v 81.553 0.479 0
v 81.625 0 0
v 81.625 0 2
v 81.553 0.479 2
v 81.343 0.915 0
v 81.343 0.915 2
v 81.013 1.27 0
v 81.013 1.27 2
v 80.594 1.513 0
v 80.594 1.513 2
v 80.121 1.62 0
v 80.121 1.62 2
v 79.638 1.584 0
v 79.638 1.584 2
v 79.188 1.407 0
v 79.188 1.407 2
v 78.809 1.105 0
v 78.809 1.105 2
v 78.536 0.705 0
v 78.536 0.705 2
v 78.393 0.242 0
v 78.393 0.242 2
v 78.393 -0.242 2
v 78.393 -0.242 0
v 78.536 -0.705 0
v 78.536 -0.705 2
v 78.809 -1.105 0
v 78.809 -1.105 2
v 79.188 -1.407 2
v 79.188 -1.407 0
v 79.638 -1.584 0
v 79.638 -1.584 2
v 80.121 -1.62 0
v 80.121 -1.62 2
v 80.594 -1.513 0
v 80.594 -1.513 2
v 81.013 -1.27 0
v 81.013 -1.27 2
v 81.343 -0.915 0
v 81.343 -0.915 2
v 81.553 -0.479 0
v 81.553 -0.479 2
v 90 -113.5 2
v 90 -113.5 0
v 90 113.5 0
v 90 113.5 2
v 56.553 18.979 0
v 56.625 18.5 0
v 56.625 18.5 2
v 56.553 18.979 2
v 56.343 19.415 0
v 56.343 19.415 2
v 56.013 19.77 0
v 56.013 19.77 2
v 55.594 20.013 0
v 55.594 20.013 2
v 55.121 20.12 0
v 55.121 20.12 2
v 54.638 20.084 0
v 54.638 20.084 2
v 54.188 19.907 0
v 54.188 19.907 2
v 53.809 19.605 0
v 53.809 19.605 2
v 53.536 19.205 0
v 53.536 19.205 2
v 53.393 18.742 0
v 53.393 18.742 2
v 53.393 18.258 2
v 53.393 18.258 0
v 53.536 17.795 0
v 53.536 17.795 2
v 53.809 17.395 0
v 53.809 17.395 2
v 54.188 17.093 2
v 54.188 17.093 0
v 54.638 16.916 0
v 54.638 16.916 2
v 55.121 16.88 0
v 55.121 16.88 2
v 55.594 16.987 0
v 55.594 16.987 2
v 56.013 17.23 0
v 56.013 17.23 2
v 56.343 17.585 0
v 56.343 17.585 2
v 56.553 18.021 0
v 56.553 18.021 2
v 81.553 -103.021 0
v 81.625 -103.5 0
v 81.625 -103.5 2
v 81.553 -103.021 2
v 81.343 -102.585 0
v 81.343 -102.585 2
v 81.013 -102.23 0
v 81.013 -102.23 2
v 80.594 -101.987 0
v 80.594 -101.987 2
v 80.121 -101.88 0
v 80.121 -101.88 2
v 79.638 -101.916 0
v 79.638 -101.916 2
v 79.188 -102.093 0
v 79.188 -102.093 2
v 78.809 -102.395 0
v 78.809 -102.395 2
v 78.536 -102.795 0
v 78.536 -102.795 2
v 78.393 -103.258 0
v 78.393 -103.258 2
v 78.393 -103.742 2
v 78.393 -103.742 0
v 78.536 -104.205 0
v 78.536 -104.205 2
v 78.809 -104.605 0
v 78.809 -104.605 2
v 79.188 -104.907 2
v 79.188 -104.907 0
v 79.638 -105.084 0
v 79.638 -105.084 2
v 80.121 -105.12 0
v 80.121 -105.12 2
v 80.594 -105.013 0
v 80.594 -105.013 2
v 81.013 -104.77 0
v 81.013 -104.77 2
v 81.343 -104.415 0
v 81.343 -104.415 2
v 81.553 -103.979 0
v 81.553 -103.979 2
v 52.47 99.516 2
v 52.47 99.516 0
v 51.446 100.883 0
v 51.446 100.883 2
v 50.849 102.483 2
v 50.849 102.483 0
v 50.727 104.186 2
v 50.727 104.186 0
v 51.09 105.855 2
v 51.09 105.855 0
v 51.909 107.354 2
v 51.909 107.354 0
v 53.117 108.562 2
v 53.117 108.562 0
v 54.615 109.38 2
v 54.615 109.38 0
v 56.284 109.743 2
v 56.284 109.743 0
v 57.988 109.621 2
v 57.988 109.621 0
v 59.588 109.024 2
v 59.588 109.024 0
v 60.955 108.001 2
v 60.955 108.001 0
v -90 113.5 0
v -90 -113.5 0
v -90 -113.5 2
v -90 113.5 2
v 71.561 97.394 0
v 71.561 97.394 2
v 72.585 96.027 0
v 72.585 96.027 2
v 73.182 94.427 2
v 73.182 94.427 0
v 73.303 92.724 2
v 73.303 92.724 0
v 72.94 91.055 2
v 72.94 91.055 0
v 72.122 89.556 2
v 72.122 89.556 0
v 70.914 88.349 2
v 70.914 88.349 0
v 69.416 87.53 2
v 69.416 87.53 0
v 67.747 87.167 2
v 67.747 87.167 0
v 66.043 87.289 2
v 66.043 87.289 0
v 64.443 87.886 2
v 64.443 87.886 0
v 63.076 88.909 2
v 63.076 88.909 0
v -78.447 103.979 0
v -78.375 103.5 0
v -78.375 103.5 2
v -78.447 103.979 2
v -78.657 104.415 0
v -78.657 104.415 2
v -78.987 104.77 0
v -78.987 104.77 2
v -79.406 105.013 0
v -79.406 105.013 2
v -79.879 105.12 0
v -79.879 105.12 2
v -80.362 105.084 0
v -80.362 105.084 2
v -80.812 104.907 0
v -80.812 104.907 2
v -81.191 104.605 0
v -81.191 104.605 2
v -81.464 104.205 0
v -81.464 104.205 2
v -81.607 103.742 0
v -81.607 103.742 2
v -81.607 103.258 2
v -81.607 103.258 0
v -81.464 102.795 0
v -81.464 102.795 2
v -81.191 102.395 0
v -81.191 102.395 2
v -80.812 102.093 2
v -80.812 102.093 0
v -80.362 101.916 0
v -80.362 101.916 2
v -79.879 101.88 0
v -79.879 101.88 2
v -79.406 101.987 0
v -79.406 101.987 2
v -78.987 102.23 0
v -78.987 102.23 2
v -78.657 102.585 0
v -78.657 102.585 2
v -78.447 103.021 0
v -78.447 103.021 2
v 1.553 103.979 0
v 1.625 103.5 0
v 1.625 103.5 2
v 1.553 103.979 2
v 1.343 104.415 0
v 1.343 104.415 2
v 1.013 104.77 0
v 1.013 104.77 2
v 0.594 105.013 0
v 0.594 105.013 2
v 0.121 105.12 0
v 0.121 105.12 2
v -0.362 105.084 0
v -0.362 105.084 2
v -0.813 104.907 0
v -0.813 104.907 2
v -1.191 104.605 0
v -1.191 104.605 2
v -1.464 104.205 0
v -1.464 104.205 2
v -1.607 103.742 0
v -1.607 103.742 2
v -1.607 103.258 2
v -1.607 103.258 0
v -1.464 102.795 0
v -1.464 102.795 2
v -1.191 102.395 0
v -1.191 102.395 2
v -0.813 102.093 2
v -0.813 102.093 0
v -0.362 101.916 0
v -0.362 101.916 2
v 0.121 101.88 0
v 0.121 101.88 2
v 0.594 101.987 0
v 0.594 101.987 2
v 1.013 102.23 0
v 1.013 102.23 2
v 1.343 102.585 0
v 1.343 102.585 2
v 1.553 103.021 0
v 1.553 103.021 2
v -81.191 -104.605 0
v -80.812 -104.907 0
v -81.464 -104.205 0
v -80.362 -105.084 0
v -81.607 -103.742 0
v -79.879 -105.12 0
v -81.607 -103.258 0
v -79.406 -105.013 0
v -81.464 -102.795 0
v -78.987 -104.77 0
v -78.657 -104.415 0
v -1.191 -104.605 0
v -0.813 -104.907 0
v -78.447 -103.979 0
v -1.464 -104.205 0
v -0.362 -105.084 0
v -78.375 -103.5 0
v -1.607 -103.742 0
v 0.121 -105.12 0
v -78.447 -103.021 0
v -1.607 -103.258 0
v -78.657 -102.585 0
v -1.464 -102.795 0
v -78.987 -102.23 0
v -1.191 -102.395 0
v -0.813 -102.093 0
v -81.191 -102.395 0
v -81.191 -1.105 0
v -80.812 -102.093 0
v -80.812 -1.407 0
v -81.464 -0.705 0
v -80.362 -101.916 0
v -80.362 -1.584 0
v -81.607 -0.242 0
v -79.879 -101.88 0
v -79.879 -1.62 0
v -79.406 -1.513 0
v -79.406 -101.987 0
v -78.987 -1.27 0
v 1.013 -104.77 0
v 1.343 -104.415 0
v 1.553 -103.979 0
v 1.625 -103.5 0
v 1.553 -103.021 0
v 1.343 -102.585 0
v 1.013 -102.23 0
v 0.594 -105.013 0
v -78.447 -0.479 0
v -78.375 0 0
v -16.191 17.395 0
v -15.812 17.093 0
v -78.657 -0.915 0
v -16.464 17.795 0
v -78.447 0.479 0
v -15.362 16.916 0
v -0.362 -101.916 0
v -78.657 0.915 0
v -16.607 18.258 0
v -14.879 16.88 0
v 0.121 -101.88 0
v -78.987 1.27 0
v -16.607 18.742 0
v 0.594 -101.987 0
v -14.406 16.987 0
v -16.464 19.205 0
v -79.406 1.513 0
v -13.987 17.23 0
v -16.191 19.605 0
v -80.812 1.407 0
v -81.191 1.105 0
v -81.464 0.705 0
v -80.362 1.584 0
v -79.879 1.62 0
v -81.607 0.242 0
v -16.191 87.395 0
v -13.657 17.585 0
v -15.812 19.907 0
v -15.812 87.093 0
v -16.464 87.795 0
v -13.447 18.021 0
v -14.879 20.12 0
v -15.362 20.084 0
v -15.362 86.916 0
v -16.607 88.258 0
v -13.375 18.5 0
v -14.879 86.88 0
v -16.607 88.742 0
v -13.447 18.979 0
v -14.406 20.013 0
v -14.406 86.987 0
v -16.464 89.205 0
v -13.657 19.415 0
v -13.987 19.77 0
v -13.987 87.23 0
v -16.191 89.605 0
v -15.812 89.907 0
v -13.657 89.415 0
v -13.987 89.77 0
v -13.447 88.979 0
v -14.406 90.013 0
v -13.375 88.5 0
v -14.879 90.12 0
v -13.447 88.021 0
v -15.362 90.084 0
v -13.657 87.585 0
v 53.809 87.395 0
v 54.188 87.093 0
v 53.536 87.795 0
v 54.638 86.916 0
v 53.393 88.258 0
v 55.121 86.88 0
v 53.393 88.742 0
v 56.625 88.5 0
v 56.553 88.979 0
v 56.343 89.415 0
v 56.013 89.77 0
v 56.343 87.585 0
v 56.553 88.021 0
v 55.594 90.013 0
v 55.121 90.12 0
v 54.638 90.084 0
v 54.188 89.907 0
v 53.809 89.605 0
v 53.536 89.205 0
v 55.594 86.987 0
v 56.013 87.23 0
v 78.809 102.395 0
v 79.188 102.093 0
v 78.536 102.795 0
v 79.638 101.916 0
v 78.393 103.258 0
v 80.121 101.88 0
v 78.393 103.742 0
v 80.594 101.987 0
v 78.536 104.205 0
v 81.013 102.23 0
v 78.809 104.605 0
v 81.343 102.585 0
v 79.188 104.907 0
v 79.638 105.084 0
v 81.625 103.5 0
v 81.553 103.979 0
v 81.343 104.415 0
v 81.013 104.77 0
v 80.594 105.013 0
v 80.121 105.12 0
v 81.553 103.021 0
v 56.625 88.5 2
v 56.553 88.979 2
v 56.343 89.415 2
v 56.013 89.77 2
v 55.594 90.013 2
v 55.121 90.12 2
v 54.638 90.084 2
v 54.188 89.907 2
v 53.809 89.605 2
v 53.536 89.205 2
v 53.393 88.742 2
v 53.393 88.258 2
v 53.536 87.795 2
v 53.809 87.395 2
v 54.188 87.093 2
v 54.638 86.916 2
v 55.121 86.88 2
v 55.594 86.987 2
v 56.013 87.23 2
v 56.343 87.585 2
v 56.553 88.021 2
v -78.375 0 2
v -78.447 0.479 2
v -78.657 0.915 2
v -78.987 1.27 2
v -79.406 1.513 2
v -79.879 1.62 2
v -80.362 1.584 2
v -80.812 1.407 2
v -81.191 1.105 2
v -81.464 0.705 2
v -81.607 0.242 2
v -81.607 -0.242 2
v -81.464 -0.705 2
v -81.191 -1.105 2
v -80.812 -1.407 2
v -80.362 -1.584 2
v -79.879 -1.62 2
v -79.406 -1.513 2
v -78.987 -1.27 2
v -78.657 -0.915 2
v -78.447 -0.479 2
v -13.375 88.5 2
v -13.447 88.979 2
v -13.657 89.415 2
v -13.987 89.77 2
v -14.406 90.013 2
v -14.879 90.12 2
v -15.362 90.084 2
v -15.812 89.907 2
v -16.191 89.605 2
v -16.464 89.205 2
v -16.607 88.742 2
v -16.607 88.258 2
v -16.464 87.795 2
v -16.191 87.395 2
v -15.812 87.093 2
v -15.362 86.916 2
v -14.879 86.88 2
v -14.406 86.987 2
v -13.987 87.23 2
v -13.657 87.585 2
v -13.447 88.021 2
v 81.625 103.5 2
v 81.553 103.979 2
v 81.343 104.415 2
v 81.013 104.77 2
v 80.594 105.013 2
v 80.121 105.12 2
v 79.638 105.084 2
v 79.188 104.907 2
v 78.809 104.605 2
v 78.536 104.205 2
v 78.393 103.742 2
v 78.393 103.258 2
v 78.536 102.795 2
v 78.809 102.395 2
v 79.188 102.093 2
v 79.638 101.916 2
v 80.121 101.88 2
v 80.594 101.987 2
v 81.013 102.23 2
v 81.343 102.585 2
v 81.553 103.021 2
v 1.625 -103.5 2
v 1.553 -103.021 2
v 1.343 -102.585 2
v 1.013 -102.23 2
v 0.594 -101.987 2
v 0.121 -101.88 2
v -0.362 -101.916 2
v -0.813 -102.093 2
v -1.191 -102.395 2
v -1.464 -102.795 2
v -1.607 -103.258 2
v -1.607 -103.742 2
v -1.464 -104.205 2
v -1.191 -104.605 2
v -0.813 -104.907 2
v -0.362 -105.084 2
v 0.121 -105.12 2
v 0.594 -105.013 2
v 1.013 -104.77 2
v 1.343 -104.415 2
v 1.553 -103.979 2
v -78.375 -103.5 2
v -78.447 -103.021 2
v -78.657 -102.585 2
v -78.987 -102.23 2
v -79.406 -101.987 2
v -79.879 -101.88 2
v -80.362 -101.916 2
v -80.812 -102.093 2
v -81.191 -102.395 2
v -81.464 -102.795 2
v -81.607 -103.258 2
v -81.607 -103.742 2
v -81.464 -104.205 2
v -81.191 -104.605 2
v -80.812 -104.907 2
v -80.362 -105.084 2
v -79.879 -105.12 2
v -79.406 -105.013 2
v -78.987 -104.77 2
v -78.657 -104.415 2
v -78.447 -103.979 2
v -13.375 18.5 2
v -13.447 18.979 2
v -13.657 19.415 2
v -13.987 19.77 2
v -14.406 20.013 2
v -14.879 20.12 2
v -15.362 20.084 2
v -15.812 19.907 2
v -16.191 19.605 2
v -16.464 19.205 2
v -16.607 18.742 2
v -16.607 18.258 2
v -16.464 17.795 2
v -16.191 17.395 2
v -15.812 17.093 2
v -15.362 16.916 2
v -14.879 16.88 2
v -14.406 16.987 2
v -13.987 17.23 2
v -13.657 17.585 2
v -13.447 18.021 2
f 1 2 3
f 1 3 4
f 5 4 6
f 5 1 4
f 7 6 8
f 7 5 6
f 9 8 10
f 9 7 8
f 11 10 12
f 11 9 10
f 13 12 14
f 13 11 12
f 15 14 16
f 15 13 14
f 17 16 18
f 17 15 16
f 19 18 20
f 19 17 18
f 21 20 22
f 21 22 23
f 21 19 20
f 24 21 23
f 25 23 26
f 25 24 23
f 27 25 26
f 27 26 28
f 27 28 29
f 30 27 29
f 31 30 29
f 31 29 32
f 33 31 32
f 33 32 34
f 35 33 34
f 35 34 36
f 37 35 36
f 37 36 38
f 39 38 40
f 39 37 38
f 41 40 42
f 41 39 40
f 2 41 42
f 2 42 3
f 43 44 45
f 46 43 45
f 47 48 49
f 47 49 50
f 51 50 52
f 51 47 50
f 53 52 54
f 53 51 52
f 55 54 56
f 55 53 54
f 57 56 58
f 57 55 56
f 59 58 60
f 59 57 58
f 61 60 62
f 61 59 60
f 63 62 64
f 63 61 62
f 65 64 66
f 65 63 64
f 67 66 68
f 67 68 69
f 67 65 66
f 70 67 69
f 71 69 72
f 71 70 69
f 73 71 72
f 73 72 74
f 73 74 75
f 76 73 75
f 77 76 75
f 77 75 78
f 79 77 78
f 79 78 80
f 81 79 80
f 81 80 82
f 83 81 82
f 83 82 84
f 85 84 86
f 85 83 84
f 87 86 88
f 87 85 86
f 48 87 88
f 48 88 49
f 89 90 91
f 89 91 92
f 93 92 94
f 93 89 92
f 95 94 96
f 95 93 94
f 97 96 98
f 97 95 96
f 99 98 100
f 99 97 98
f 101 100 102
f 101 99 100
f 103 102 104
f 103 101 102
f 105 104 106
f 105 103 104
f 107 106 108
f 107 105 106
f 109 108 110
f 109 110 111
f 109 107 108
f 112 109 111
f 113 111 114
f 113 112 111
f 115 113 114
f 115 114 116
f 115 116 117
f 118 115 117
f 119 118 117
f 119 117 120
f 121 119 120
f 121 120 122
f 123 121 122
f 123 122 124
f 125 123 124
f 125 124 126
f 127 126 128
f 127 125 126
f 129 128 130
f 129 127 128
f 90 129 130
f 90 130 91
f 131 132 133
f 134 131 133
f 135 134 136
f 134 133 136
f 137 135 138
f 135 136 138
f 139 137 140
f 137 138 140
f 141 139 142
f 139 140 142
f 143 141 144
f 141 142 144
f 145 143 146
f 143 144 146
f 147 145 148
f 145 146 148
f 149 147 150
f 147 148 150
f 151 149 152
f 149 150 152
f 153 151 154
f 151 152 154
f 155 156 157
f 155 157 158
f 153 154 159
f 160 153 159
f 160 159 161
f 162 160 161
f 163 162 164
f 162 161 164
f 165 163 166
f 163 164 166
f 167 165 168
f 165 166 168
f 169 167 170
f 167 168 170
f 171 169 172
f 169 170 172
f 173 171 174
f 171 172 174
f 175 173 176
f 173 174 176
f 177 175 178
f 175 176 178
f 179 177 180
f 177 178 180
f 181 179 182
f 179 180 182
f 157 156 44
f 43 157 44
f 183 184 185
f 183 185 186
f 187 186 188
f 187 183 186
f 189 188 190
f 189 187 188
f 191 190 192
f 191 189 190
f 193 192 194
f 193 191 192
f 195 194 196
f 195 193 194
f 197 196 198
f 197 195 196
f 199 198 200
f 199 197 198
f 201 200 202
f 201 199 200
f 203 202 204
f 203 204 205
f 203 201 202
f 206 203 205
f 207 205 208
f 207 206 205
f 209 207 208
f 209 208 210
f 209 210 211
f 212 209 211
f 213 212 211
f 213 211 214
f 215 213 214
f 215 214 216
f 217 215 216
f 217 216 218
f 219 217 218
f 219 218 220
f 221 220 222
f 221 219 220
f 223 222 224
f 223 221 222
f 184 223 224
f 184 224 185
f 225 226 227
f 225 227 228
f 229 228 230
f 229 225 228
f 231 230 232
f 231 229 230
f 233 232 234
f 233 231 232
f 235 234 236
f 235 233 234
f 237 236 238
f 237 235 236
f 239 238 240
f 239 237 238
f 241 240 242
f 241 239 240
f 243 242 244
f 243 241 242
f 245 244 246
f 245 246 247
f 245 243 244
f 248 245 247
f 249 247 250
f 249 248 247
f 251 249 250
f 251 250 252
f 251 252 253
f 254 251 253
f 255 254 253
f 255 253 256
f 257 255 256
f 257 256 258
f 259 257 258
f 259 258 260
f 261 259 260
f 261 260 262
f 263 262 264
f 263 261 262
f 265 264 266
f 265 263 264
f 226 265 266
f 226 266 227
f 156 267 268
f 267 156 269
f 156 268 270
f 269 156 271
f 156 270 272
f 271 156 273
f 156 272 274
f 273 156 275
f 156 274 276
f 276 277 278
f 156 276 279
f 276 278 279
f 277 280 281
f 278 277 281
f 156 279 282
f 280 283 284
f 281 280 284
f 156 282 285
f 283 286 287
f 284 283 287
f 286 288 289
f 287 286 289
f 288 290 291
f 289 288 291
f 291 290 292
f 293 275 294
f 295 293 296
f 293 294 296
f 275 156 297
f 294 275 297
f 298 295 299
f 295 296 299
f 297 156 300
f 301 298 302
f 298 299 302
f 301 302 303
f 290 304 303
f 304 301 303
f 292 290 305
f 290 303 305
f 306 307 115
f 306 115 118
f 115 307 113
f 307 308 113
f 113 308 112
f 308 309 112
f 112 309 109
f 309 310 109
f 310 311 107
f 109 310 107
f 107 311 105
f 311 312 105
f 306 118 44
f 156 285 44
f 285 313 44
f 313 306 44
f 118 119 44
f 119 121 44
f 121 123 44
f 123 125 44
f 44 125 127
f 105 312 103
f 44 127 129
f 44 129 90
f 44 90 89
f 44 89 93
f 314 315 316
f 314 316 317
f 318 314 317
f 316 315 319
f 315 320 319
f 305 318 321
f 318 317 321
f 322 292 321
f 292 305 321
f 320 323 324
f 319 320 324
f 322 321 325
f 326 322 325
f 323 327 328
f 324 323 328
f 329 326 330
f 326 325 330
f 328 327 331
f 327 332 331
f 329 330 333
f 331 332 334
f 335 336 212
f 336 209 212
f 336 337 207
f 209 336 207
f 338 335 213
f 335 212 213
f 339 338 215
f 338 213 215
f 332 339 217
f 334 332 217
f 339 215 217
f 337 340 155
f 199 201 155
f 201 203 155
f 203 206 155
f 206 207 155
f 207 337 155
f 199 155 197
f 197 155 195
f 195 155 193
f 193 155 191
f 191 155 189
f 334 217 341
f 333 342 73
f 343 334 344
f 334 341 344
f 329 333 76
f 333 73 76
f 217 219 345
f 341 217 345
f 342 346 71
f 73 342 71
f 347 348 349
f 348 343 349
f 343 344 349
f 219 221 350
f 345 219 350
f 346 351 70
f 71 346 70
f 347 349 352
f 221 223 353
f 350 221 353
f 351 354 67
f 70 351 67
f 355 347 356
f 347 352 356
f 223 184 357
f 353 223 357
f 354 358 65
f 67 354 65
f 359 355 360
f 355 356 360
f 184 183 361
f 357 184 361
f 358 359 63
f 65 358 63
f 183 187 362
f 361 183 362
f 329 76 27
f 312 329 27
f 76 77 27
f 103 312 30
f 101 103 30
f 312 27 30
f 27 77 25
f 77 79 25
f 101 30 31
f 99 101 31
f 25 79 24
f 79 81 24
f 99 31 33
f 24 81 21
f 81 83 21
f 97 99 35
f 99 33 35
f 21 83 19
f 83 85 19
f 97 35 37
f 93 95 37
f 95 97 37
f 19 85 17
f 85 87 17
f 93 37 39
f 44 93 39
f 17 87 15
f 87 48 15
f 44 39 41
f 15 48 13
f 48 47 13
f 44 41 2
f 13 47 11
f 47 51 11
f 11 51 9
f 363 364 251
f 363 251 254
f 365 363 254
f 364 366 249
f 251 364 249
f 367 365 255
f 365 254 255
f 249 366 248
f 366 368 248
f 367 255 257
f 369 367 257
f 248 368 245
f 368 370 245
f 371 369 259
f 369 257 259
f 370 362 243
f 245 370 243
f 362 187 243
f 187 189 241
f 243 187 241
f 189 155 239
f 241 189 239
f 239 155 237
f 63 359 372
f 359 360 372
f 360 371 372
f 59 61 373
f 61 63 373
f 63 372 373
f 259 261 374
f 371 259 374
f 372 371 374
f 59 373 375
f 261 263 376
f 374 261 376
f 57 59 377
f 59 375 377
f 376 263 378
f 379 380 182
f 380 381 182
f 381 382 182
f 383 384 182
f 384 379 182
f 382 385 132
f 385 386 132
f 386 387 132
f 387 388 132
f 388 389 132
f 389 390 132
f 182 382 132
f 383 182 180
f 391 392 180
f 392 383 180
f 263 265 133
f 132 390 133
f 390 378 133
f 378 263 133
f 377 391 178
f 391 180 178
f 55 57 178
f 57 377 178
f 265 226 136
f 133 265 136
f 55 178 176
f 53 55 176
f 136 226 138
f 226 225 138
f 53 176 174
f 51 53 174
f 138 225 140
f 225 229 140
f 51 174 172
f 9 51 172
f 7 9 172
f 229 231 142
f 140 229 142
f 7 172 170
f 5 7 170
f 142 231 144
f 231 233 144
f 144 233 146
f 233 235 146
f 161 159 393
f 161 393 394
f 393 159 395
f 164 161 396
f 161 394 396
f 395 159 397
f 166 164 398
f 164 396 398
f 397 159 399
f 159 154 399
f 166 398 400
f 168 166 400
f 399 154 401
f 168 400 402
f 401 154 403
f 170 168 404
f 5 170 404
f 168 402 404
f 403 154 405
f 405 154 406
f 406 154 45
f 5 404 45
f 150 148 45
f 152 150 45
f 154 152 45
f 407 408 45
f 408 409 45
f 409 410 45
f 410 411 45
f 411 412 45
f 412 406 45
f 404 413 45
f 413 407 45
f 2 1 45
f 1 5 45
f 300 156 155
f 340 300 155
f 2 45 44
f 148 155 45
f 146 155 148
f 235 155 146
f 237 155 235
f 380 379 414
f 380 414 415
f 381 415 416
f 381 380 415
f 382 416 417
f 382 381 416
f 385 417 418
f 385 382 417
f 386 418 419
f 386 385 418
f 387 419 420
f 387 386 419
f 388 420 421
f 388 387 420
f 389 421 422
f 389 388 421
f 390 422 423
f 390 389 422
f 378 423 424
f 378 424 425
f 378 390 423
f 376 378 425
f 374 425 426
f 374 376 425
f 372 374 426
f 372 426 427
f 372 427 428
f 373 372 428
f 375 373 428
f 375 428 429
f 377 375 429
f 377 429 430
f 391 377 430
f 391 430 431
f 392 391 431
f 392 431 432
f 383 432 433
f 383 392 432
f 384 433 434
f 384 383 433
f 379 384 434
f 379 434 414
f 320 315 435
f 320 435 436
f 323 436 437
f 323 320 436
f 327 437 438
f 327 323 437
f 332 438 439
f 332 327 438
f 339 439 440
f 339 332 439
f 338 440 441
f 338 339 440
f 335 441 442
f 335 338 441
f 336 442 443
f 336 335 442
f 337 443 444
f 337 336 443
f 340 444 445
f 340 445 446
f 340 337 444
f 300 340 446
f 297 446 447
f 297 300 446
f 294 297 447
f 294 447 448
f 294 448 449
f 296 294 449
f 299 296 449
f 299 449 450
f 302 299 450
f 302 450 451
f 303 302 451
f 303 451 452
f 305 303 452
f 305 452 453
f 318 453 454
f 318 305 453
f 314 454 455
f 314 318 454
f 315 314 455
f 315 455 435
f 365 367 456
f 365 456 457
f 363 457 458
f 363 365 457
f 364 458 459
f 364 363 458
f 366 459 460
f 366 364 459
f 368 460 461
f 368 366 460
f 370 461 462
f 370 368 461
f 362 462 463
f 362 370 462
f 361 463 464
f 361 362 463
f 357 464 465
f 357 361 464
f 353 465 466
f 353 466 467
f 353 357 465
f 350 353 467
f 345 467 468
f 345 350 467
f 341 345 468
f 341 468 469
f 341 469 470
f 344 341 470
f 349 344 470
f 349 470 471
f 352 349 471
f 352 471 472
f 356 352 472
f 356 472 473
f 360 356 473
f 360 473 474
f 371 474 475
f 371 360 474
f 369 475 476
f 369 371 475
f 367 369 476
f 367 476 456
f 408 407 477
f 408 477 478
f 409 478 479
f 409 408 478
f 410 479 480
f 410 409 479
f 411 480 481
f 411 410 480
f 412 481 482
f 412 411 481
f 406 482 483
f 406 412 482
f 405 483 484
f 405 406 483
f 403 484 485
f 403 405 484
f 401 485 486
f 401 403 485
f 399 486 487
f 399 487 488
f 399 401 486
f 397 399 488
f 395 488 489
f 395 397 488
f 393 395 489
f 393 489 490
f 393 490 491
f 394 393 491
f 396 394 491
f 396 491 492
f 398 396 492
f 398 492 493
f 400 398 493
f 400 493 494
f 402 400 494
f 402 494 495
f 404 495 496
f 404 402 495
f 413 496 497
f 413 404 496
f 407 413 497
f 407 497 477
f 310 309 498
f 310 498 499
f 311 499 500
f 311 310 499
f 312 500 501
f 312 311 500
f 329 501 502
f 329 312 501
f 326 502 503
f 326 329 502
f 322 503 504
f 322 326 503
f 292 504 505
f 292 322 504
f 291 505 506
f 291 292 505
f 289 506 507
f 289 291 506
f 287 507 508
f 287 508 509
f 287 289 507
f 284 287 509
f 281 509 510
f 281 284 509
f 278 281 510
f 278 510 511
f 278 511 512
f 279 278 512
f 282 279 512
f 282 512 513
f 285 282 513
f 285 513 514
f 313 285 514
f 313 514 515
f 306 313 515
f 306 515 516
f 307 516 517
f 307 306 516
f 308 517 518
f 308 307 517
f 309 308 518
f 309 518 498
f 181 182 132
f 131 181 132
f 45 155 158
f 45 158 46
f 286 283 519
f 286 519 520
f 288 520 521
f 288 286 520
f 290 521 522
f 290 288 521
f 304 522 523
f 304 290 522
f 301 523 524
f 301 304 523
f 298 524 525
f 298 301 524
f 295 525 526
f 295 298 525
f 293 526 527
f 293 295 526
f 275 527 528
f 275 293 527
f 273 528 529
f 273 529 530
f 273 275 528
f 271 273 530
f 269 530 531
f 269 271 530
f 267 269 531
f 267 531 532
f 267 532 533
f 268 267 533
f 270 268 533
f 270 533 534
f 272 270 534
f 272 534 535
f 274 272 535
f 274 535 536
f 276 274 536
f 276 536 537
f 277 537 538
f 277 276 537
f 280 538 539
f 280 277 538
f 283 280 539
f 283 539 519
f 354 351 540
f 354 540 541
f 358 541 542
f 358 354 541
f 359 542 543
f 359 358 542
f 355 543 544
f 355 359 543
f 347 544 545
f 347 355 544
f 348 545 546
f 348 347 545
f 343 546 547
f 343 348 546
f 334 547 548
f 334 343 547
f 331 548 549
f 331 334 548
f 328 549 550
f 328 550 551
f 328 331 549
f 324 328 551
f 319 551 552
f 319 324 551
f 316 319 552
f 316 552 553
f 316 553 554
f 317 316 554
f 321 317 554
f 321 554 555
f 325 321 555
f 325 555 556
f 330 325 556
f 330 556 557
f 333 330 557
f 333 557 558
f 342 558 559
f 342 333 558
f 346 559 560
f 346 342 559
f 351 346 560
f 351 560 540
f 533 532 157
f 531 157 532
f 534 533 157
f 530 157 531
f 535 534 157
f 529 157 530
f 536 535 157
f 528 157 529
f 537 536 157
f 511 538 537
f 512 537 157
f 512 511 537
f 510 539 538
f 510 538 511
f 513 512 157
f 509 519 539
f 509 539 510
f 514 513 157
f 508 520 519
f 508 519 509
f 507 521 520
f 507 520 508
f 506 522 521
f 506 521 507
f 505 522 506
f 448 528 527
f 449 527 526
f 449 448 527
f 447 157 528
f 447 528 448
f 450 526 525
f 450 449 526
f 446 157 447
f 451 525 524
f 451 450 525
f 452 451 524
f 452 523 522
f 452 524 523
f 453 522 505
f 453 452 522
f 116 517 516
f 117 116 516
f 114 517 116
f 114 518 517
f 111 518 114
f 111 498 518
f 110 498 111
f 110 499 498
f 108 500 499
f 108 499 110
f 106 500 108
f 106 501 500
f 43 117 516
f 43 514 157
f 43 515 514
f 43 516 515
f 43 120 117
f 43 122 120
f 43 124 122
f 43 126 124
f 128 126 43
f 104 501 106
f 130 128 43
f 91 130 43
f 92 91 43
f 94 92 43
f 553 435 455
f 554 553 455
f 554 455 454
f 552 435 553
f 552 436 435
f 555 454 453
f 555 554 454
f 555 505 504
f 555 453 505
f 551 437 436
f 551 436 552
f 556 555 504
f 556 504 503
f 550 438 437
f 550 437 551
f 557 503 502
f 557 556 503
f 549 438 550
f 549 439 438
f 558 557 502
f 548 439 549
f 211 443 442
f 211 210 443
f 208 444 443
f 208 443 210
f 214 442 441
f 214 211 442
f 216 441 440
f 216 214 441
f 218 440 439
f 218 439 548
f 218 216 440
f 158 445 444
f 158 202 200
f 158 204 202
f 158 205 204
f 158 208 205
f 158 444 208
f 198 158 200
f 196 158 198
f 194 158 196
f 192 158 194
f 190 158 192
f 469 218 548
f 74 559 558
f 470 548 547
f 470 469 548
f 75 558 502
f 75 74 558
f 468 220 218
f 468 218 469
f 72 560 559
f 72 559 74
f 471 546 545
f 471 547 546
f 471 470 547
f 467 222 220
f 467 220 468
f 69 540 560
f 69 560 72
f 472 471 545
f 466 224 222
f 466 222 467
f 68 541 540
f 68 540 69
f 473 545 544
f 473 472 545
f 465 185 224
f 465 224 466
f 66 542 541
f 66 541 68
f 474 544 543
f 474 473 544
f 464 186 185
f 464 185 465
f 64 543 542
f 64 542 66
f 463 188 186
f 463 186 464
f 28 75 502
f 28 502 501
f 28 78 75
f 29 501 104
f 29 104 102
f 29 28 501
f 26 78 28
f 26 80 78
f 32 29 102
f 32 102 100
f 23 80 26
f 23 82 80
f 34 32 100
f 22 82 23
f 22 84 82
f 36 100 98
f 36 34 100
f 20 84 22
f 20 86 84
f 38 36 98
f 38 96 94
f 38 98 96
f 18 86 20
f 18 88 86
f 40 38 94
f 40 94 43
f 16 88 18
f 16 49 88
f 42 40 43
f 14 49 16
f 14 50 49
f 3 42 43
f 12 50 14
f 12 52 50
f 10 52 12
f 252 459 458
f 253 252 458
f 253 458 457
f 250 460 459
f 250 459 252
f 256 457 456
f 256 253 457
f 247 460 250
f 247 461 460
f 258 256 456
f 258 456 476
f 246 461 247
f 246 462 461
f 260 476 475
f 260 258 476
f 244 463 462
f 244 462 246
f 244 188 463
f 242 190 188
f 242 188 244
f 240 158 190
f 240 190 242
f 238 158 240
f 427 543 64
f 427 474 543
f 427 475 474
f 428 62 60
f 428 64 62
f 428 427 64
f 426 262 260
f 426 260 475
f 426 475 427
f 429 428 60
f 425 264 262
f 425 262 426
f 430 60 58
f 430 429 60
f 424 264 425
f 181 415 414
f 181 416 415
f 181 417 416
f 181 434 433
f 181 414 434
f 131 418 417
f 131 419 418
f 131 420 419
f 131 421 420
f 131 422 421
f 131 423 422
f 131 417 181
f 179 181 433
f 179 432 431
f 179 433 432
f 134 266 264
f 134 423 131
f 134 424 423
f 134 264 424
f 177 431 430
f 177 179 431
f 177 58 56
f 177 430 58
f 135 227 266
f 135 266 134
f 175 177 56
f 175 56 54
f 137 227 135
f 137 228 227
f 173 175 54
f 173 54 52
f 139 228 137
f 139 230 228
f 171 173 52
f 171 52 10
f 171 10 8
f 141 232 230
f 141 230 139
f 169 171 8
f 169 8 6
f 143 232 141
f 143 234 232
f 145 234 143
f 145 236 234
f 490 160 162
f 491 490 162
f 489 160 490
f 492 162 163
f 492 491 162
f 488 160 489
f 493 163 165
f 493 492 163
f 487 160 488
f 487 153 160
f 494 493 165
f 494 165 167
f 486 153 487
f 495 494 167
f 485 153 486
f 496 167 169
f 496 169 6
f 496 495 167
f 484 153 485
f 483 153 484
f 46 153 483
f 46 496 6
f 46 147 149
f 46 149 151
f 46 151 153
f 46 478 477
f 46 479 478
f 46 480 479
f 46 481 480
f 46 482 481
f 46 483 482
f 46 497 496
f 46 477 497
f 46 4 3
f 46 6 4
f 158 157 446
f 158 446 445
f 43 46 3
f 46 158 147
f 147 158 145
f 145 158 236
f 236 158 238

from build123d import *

# Parameters (mm, degrees)
SKETCH_1_W      = 180
SKETCH_1_H      = 227
SKETCH_1_R      = 1.625
EXTRUDE_1_DEPTH = 2


with BuildPart() as part:
    # 草图1 → 凸台-拉伸1 (new body)
    with BuildSketch(Plane.XY):
        Rectangle(SKETCH_1_W, SKETCH_1_H)
        with Locations((-15, 88.5)):
            Circle(SKETCH_1_R, mode=Mode.SUBTRACT)
        with Locations((55, 88.5)):
            Circle(SKETCH_1_R, mode=Mode.SUBTRACT)
        with Locations((55, 18.5)):
            Circle(SKETCH_1_R, mode=Mode.SUBTRACT)
        with Locations((-15, 18.5)):
            Circle(SKETCH_1_R, mode=Mode.SUBTRACT)
        with Locations((-80, 103.5)):
            Circle(SKETCH_1_R, mode=Mode.SUBTRACT)
        with Locations((0, 103.5)):
            Circle(SKETCH_1_R, mode=Mode.SUBTRACT)
        with Locations((80, 103.5)):
            Circle(SKETCH_1_R, mode=Mode.SUBTRACT)
        with Locations((80, -103.5)):
            Circle(SKETCH_1_R, mode=Mode.SUBTRACT)
        with Locations((0, -103.5)):
            Circle(SKETCH_1_R, mode=Mode.SUBTRACT)
        with Locations((-80, -103.5)):
            Circle(SKETCH_1_R, mode=Mode.SUBTRACT)
        with Locations((80, 0)):
            Circle(SKETCH_1_R, mode=Mode.SUBTRACT)
        with Locations((-80, 0)):
            Circle(SKETCH_1_R, mode=Mode.SUBTRACT)
        with BuildLine():
            Line((63.076132364, 88.90914901), (52.469530647, 99.515750728))
            ThreePointArc((52.469530647, 99.515750728), (52.469530647, 108.001032102), (60.954812021, 108.001032102))
            Line((60.954812021, 108.001032102), (71.561413739, 97.394430384))
            ThreePointArc((71.561413739, 97.394430384), (71.561413739, 88.90914901), (63.076132364, 88.90914901))
        make_face(mode=Mode.SUBTRACT)
    extrude(amount=EXTRUDE_1_DEPTH)


solid = part.part
